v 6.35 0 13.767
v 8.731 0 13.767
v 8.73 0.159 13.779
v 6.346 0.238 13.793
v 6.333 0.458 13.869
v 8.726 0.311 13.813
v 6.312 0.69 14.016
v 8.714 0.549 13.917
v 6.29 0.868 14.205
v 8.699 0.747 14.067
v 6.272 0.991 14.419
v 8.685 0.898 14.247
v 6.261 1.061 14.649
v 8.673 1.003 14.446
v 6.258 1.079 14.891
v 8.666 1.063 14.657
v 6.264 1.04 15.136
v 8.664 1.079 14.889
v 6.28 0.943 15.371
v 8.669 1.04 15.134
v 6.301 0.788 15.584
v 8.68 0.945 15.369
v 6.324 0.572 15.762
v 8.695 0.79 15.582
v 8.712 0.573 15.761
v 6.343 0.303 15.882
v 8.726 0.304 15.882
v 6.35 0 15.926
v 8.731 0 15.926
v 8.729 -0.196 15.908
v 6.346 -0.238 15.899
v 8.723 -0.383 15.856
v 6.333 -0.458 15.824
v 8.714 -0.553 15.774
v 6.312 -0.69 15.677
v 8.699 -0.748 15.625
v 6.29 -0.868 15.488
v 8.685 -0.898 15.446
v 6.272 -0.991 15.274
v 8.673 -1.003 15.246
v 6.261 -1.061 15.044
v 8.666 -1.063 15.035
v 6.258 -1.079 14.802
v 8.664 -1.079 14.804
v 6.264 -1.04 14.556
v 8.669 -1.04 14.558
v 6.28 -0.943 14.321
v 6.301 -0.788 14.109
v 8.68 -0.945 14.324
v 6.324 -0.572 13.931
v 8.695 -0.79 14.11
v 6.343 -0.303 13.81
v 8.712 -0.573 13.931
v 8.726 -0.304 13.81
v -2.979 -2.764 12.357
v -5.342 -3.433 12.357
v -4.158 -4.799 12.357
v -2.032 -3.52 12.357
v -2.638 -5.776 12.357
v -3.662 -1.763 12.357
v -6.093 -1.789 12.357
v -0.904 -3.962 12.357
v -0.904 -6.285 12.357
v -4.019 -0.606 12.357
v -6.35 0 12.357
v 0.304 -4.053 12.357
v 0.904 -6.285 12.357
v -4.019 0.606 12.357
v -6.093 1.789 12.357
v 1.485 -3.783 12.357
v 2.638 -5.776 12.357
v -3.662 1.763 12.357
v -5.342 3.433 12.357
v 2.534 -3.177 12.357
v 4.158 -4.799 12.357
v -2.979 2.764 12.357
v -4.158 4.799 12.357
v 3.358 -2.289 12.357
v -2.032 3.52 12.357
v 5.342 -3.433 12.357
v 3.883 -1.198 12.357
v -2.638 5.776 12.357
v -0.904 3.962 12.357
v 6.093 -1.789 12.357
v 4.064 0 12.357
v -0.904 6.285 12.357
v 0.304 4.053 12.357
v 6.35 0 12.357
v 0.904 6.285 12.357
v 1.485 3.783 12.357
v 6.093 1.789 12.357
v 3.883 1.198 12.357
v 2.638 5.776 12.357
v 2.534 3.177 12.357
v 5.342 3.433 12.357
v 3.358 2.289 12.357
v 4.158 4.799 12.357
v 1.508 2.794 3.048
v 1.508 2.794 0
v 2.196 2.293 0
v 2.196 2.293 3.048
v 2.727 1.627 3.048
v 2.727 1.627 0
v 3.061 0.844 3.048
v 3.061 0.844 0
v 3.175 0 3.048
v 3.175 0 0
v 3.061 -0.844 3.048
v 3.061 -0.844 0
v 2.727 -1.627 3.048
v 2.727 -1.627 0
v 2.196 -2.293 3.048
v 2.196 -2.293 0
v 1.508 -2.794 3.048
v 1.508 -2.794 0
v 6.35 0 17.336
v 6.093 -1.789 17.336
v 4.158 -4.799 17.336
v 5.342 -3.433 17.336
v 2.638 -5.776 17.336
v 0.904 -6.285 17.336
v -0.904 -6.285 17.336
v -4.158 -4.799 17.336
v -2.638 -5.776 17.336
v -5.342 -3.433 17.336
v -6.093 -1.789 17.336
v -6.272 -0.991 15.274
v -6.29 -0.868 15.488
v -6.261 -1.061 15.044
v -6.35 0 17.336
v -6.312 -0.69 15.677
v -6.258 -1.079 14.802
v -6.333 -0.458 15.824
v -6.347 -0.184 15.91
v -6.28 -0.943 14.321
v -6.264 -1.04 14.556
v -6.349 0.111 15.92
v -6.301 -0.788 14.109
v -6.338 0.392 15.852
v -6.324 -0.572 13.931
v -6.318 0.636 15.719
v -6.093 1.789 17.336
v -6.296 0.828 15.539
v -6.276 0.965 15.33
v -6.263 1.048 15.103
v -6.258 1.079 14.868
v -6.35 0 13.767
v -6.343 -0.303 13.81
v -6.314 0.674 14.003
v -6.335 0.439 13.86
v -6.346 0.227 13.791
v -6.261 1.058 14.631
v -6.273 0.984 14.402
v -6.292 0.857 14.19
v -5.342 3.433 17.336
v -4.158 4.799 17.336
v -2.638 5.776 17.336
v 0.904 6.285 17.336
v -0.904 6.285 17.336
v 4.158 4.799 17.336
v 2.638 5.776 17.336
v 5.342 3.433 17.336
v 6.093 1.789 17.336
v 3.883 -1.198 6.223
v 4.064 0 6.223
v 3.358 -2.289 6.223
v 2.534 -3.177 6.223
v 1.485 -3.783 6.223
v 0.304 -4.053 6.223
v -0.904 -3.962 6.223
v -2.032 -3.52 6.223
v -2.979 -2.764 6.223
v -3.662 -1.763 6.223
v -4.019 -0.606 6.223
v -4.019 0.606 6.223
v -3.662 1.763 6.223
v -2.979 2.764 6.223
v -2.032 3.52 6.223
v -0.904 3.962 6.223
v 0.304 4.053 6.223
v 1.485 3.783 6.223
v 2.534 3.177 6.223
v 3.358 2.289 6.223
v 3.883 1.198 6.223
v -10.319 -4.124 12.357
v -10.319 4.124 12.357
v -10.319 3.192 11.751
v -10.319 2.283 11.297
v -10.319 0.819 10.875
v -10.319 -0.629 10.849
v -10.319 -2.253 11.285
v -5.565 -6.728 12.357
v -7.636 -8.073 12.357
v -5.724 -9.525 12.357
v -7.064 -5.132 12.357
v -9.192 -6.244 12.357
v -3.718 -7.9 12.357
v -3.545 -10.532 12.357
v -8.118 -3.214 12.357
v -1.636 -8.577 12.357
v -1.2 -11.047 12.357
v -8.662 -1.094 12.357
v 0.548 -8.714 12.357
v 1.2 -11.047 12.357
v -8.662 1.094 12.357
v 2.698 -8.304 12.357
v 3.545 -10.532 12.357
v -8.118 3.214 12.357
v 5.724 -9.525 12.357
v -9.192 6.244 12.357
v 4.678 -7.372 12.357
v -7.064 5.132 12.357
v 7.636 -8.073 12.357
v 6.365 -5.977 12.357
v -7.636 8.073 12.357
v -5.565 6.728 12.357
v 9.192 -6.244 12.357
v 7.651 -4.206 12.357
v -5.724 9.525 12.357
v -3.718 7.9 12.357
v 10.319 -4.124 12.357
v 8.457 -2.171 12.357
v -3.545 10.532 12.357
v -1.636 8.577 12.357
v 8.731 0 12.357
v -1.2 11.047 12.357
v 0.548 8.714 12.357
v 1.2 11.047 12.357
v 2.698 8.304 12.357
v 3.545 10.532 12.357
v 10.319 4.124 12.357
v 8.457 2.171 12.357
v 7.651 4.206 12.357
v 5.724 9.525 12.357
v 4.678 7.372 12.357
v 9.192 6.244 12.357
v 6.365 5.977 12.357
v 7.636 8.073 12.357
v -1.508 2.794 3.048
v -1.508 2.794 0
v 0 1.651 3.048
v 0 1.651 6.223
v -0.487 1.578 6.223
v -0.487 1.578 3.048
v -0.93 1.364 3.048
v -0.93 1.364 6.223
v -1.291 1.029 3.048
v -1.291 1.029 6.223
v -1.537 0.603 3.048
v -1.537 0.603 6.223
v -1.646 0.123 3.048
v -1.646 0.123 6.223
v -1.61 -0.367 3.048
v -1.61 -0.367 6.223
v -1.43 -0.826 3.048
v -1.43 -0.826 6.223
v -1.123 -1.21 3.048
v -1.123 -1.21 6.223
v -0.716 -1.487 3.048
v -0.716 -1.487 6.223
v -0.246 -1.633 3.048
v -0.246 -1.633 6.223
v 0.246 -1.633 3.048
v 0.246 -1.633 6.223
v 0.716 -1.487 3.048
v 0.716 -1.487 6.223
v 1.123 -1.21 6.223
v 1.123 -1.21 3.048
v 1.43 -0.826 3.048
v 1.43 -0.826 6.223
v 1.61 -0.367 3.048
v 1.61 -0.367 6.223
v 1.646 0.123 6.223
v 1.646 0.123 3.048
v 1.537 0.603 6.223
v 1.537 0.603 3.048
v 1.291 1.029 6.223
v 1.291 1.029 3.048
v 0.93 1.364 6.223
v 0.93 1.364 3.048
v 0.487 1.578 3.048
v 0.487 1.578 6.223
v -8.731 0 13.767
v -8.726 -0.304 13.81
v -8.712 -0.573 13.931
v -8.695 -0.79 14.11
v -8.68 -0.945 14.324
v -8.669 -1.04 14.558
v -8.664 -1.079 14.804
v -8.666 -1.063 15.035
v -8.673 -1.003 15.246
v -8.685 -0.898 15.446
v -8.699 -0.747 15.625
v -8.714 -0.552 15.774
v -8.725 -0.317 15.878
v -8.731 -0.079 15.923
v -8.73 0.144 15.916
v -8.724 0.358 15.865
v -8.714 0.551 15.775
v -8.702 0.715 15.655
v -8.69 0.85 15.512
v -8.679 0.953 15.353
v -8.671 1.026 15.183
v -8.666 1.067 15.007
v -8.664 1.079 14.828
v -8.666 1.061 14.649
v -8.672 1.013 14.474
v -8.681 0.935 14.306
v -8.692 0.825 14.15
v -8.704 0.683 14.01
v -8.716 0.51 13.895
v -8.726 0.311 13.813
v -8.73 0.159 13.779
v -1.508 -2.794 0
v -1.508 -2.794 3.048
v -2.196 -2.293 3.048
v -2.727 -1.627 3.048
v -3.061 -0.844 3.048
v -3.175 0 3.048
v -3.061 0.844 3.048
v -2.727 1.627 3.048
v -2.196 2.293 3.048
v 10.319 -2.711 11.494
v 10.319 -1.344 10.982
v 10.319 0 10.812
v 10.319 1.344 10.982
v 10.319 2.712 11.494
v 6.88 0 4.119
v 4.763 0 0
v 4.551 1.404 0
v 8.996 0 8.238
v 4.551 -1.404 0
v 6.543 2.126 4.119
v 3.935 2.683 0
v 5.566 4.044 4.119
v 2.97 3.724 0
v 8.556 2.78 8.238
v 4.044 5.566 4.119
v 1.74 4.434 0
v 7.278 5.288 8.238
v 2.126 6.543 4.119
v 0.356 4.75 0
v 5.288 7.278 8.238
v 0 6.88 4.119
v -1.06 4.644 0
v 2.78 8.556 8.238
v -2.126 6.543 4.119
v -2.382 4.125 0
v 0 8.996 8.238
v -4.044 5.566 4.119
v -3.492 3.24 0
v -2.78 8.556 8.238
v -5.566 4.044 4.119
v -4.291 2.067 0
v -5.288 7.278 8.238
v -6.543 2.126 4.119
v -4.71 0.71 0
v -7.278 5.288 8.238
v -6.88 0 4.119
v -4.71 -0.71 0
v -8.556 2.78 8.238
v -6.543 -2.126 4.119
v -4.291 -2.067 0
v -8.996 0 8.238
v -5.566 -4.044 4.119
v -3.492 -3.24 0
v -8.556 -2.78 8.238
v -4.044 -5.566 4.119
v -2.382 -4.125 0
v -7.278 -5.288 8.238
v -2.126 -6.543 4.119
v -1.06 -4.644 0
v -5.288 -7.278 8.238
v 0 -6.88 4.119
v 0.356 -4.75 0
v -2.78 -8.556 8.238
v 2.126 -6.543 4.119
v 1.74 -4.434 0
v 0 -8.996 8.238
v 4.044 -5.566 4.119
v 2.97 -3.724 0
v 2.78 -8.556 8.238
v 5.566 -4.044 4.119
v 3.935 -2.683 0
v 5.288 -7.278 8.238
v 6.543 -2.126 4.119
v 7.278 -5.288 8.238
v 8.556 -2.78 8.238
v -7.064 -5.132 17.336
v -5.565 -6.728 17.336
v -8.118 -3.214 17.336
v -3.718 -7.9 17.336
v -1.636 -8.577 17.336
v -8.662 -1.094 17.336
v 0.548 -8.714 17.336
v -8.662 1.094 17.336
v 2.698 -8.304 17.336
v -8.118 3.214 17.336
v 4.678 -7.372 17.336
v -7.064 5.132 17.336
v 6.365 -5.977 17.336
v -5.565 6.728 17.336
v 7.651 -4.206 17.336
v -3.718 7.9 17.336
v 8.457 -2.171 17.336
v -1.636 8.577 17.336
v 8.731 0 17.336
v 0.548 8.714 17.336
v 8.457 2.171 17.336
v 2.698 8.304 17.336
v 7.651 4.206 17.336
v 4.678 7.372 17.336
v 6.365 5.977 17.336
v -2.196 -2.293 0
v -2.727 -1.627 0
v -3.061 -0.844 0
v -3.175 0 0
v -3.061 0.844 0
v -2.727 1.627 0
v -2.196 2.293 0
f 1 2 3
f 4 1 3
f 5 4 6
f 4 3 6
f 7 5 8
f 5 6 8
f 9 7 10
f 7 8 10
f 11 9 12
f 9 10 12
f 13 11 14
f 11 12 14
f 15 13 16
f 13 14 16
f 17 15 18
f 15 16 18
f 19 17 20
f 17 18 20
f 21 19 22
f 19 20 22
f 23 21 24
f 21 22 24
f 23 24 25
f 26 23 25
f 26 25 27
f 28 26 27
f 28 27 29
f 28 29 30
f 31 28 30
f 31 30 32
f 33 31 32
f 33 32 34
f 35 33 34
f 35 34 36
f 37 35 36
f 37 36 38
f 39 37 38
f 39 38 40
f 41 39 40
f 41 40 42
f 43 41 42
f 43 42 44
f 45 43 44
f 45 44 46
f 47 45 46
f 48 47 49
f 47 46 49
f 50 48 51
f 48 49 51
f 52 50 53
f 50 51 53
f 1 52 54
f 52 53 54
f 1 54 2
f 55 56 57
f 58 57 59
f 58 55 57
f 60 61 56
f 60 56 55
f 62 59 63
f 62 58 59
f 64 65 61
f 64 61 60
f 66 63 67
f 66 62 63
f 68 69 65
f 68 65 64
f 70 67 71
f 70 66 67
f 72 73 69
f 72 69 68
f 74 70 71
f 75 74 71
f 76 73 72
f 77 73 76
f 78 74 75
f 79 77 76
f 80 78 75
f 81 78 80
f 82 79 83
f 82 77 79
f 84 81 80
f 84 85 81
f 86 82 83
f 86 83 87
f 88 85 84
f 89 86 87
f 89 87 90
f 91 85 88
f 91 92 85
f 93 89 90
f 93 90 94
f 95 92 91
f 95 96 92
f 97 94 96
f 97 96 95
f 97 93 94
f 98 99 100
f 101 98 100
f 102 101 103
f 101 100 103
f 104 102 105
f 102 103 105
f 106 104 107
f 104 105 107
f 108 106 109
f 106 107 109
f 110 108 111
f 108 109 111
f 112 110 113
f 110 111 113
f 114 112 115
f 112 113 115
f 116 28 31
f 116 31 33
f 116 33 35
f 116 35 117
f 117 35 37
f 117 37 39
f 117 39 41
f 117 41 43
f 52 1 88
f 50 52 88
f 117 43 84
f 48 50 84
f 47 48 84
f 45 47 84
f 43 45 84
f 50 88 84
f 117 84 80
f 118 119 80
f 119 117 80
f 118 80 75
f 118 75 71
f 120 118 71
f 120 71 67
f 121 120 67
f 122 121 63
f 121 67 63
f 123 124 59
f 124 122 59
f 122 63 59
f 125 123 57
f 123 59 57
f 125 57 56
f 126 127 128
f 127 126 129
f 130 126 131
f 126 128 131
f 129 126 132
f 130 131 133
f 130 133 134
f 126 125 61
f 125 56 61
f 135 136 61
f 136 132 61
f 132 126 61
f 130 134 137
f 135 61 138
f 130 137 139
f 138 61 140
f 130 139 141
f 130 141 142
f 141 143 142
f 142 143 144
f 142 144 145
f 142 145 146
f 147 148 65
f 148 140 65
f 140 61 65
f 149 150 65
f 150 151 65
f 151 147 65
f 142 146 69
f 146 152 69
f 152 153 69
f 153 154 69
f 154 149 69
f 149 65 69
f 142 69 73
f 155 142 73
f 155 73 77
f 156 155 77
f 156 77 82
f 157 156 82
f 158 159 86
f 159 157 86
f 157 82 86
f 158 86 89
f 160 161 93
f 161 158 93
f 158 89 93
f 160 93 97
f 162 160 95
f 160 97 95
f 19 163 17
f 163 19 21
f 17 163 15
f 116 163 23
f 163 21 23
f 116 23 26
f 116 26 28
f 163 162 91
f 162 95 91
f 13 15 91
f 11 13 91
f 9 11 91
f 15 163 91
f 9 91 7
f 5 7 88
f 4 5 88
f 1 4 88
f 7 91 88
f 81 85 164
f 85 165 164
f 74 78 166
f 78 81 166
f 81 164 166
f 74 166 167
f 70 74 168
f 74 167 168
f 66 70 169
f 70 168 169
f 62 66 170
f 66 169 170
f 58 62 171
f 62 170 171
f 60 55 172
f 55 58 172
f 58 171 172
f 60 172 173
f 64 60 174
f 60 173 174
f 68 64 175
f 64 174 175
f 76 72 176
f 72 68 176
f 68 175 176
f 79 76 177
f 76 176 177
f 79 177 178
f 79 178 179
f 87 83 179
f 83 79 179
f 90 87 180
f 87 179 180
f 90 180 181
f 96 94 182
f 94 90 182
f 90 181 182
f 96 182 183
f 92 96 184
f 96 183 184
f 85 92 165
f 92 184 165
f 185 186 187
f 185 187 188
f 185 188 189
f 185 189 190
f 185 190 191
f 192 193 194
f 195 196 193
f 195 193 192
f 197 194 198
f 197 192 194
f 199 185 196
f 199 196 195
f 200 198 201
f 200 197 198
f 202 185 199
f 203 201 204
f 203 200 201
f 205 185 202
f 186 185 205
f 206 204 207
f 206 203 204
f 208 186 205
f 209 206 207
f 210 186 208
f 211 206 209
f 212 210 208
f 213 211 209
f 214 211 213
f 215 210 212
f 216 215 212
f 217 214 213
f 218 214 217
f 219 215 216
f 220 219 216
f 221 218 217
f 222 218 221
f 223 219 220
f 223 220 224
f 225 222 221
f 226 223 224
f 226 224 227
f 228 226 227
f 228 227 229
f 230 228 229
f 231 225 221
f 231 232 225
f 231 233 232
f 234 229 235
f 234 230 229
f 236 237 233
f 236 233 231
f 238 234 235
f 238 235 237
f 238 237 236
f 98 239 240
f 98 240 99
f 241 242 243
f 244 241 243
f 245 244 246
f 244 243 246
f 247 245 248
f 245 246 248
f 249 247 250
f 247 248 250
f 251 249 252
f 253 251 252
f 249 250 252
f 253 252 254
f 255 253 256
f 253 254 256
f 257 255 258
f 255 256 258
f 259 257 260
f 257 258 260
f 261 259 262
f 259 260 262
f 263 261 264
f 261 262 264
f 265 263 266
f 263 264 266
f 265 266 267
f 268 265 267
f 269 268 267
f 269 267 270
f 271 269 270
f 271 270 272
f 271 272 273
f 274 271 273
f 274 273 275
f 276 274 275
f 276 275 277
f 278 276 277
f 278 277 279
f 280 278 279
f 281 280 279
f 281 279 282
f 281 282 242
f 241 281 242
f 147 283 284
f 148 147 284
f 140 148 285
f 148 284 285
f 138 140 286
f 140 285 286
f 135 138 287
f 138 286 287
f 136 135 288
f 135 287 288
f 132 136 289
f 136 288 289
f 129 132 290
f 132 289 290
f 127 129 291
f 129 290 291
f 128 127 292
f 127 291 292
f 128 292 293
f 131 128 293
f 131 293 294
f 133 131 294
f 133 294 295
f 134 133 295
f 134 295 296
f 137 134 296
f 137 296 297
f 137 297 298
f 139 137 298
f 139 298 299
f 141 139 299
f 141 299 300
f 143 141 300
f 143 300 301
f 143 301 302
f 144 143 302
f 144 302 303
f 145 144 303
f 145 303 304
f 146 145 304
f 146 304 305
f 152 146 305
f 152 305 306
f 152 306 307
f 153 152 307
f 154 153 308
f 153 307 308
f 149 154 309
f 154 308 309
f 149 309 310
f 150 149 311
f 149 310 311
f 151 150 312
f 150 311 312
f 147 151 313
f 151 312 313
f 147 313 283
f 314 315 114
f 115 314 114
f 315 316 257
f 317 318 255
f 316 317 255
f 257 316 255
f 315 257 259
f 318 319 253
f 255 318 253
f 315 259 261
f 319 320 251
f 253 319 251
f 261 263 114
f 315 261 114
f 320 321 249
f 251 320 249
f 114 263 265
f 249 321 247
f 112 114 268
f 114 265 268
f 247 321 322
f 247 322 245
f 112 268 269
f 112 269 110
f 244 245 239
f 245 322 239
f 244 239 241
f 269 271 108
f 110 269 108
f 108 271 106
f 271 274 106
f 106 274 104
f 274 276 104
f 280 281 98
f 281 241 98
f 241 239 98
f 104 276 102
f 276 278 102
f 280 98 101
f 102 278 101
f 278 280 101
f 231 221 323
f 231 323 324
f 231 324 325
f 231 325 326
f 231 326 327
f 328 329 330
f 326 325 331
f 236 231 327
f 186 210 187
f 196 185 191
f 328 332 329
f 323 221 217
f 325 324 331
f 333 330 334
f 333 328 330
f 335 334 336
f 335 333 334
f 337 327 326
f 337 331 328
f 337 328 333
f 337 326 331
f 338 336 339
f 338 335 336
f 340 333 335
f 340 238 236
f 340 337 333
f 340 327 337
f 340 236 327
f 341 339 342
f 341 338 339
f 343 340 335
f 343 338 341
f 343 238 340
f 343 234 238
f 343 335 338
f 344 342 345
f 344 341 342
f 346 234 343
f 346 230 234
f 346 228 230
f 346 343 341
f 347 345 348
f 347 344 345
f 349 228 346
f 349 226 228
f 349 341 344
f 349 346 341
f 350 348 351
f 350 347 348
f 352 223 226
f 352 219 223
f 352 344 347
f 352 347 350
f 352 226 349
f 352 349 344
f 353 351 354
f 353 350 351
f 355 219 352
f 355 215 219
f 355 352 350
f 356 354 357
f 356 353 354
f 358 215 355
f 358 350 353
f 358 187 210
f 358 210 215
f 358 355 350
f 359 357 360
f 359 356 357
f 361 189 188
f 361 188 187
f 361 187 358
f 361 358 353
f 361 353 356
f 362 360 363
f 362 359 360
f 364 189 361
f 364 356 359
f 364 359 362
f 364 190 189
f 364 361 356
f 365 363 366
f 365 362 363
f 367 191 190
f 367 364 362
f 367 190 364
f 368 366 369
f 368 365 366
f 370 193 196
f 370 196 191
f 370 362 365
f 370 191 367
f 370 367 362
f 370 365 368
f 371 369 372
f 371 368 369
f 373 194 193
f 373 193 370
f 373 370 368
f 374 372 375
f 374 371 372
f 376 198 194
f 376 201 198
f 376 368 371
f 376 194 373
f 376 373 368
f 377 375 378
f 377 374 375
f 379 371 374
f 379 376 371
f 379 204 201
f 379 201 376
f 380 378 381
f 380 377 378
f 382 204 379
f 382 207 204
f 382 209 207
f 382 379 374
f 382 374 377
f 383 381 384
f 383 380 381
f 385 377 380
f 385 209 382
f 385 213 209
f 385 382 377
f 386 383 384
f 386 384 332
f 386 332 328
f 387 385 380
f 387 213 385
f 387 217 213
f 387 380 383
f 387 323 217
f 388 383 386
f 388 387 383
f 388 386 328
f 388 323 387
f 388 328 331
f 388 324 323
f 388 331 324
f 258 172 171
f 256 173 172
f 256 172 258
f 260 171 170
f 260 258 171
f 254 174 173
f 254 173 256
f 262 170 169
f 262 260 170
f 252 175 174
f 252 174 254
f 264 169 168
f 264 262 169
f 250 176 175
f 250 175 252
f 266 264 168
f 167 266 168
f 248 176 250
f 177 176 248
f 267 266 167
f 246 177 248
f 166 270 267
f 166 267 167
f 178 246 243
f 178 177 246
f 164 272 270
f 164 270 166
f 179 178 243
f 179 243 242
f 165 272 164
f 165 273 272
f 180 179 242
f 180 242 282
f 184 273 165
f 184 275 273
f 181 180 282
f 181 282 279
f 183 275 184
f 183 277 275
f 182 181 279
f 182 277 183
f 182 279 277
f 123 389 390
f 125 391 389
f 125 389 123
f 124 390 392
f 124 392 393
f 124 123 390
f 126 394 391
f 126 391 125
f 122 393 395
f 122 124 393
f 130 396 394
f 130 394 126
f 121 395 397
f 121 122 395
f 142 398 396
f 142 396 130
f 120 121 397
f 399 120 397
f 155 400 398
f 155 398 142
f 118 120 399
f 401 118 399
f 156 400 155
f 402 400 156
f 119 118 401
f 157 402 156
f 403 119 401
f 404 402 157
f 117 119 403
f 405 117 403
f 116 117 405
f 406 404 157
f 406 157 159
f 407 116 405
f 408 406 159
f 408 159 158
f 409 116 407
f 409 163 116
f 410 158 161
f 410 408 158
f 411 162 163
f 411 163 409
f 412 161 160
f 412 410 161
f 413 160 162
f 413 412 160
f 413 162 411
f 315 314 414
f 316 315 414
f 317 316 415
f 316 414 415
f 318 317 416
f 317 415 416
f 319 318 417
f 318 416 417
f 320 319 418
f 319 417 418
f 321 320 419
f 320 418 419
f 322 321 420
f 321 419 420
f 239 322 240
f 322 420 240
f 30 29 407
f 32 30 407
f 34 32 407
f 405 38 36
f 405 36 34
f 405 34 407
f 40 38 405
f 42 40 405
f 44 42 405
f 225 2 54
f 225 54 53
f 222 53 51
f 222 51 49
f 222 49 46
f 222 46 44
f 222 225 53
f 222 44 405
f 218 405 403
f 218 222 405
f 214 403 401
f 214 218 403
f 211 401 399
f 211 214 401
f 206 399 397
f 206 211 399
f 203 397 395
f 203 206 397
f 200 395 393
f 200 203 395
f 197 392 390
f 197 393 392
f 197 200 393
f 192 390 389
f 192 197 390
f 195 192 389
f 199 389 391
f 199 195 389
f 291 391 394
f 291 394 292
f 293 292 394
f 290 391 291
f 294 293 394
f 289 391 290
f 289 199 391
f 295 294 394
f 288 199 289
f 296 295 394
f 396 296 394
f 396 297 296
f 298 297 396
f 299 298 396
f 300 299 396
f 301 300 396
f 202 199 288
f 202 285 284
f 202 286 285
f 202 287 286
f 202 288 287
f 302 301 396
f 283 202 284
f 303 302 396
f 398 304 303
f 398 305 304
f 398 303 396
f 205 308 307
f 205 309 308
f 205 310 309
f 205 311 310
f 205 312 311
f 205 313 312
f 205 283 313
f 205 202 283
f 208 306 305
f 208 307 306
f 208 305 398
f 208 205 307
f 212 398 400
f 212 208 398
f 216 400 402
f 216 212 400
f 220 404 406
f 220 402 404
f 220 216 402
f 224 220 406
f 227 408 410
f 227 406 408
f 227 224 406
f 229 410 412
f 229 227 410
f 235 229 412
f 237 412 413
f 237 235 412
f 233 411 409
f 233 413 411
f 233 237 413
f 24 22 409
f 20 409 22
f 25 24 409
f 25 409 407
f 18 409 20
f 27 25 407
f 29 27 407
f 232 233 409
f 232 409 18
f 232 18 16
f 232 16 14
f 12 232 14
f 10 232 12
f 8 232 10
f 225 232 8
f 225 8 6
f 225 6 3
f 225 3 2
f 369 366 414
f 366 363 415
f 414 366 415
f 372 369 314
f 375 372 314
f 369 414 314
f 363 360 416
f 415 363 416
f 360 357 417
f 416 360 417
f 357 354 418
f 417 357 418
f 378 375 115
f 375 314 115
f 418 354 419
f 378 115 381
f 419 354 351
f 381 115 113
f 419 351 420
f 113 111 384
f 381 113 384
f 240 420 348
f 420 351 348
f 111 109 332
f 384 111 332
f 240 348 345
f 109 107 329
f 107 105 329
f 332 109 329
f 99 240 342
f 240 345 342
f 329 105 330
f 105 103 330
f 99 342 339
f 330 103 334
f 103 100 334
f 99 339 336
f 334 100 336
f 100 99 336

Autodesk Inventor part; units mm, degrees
ref_plane "YZ Plane" through (0, 0, 0) normal (1, 0, 0) x (0, 1, 0)
ref_plane "XZ Plane" through (0, 0, 0) normal (0, 1, 0) x (-1, 0, 0)
ref_plane "XY Plane" through (0, 0, 0) normal (0, 0, 1) x (1, 0, 0)
sketch "Sketch1" plane through (0, 0, 0) normal (0, 0, 1) x (1, 0, 0)
  arc A0 (-1.508, 2.794) -> (-1.508, -2.794) centre (0, 0) ccw
  line L0 (-3.175, 0) -> (0, 0) construction
  line L1 (0, 0) -> (3.175, 0) construction
  line L2 (-1.508, 2.794) -> (1.508, 2.794)
  line L3 (-1.508, -2.794) -> (1.508, -2.794)
  arc A1 (1.508, 2.794) -> (-1.508, 2.794) centre (0, 0) ccw construction
  arc A2 (1.508, -2.794) -> (1.508, 2.794) centre (0, 0) ccw
  arc A3 (-1.508, -2.794) -> (1.508, -2.794) centre (0, 0) ccw construction
  circle A4 centre (0, 0) radius 3.429 construction
  circle A5 centre (0, 0) radius 4.064
  circle A6 centre (0, 0) radius 11.1125
  dimension "d1" = 2.794
  dimension "d2" = 3.175
  dimension "d3" = 6.858
  dimension "d5" = 0.635
  dimension "d6" = 22.225
extrude "Extrusion1" add sketch "Sketch1" along normal blind 3.048 contours A5 | A6
sketch "Sketch2" plane through (0, 0, 3.048) normal (0, 0, 1) x (1, 0, 0)
  circle A0 centre (0, 0) radius 11.1125 projected
  arc A1 (-1.508, 2.794) -> (-1.508, -2.794) centre (0, 0) ccw projected
extrude "Extrusion2" add sketch "Sketch2" along normal blind 3.175
hole "Hole1" at (0, 0, 3.048) direction (0, 0, 1) diameter 3.302 depth 25.4 tip angle 118 thread size "8-32 UNC" class "2B" standard "ANSI Unified Screw Threads"
sketch "Sketch3" plane through (0, 0, 6.223) normal (0, 0, 1) x (1, 0, 0)
  circle A0 centre (0, 0) radius 11.1125 projected
  circle A1 centre (0, 0) radius 3.429
  circle A2 centre (0, 0) radius 4.064
  dimension "d18" = 6.858
  dimension "d19" = 0.635
extrude "Extrusion3" add sketch "Sketch3" along normal blind 6.1341 contours A0
chamfer "Chamfer1" distance 6.35 distance2 12.3571 1 edges at (-11.1125, 0, 0) measured on face at (0.4465, -5.5398, 0)
sketch "Sketch6" plane through (0, 0, 12.3571) normal (0, 0, 1) x (1, 0, 0)
  circle A0 centre (0, 0) radius 11.1125 projected
  circle A1 centre (0, 0) radius 6.35
  circle A2 centre (0, 0) radius 8.7312
  dimension "d38" = 12.7
  dimension "d52" = 2.3813
  dimension "d53" = 2.3813
extrude "Extrusion5" add sketch "Sketch6" along normal blind 4.9784 contours A2
sketch "Sketch7" plane through (0, 0, 0) normal (1, 0, 0) x (0, 1, 0)
  line L0 (-6.35, 17.3355) -> (6.35, 17.3355) projected
  line L1 (6.35, 12.3571) -> (-6.35, 12.3571) projected
  line L2 (0, 0) -> (0, 12.3571) construction
  line L3 (0, 12.3571) -> (0, 17.3355) construction
  point P0 (0, 14.8463)
hole "Hole3" at (0, 0, 14.8463) direction (-1, 0, 0) diameter 2.159 end through all
sketch "Sketch8" plane through (0, 0, 12.3571) normal (0, 0, 1) x (1, 0, 0)
  circle A0 centre (0, 0) radius 11.1125 projected
  circle A1 centre (0, 0) radius 8.7312 projected
  line L0 (-10.3187, 4.1244) -> (-10.3188, -4.1244)
  line L1 (-11.1125, 0) -> (0, 0)
  dimension "d49" = 0.7937
extrude "Extrusion6" cut sketch "Sketch8" against normal through all contours L0 L1 A0 | A0 L1 L0
mirror "Mirror2" about plane through (0, 0, 0) normal (1, 0, 0) of "Hole3", "Extrusion6"
ref_plane "Work Plane2" through (0, 0, 4.953) normal (0, 0, -1) x (-1, 0, 0)
sketch "Sketch9" plane through (0, 0, 4.953) normal (0, 0, -1) x (-1, 0, 0)
  point P0 (0, 0)
equation "\"d52\" = d53"
properties part number "Pneumatic Connector -Actuator Side"
